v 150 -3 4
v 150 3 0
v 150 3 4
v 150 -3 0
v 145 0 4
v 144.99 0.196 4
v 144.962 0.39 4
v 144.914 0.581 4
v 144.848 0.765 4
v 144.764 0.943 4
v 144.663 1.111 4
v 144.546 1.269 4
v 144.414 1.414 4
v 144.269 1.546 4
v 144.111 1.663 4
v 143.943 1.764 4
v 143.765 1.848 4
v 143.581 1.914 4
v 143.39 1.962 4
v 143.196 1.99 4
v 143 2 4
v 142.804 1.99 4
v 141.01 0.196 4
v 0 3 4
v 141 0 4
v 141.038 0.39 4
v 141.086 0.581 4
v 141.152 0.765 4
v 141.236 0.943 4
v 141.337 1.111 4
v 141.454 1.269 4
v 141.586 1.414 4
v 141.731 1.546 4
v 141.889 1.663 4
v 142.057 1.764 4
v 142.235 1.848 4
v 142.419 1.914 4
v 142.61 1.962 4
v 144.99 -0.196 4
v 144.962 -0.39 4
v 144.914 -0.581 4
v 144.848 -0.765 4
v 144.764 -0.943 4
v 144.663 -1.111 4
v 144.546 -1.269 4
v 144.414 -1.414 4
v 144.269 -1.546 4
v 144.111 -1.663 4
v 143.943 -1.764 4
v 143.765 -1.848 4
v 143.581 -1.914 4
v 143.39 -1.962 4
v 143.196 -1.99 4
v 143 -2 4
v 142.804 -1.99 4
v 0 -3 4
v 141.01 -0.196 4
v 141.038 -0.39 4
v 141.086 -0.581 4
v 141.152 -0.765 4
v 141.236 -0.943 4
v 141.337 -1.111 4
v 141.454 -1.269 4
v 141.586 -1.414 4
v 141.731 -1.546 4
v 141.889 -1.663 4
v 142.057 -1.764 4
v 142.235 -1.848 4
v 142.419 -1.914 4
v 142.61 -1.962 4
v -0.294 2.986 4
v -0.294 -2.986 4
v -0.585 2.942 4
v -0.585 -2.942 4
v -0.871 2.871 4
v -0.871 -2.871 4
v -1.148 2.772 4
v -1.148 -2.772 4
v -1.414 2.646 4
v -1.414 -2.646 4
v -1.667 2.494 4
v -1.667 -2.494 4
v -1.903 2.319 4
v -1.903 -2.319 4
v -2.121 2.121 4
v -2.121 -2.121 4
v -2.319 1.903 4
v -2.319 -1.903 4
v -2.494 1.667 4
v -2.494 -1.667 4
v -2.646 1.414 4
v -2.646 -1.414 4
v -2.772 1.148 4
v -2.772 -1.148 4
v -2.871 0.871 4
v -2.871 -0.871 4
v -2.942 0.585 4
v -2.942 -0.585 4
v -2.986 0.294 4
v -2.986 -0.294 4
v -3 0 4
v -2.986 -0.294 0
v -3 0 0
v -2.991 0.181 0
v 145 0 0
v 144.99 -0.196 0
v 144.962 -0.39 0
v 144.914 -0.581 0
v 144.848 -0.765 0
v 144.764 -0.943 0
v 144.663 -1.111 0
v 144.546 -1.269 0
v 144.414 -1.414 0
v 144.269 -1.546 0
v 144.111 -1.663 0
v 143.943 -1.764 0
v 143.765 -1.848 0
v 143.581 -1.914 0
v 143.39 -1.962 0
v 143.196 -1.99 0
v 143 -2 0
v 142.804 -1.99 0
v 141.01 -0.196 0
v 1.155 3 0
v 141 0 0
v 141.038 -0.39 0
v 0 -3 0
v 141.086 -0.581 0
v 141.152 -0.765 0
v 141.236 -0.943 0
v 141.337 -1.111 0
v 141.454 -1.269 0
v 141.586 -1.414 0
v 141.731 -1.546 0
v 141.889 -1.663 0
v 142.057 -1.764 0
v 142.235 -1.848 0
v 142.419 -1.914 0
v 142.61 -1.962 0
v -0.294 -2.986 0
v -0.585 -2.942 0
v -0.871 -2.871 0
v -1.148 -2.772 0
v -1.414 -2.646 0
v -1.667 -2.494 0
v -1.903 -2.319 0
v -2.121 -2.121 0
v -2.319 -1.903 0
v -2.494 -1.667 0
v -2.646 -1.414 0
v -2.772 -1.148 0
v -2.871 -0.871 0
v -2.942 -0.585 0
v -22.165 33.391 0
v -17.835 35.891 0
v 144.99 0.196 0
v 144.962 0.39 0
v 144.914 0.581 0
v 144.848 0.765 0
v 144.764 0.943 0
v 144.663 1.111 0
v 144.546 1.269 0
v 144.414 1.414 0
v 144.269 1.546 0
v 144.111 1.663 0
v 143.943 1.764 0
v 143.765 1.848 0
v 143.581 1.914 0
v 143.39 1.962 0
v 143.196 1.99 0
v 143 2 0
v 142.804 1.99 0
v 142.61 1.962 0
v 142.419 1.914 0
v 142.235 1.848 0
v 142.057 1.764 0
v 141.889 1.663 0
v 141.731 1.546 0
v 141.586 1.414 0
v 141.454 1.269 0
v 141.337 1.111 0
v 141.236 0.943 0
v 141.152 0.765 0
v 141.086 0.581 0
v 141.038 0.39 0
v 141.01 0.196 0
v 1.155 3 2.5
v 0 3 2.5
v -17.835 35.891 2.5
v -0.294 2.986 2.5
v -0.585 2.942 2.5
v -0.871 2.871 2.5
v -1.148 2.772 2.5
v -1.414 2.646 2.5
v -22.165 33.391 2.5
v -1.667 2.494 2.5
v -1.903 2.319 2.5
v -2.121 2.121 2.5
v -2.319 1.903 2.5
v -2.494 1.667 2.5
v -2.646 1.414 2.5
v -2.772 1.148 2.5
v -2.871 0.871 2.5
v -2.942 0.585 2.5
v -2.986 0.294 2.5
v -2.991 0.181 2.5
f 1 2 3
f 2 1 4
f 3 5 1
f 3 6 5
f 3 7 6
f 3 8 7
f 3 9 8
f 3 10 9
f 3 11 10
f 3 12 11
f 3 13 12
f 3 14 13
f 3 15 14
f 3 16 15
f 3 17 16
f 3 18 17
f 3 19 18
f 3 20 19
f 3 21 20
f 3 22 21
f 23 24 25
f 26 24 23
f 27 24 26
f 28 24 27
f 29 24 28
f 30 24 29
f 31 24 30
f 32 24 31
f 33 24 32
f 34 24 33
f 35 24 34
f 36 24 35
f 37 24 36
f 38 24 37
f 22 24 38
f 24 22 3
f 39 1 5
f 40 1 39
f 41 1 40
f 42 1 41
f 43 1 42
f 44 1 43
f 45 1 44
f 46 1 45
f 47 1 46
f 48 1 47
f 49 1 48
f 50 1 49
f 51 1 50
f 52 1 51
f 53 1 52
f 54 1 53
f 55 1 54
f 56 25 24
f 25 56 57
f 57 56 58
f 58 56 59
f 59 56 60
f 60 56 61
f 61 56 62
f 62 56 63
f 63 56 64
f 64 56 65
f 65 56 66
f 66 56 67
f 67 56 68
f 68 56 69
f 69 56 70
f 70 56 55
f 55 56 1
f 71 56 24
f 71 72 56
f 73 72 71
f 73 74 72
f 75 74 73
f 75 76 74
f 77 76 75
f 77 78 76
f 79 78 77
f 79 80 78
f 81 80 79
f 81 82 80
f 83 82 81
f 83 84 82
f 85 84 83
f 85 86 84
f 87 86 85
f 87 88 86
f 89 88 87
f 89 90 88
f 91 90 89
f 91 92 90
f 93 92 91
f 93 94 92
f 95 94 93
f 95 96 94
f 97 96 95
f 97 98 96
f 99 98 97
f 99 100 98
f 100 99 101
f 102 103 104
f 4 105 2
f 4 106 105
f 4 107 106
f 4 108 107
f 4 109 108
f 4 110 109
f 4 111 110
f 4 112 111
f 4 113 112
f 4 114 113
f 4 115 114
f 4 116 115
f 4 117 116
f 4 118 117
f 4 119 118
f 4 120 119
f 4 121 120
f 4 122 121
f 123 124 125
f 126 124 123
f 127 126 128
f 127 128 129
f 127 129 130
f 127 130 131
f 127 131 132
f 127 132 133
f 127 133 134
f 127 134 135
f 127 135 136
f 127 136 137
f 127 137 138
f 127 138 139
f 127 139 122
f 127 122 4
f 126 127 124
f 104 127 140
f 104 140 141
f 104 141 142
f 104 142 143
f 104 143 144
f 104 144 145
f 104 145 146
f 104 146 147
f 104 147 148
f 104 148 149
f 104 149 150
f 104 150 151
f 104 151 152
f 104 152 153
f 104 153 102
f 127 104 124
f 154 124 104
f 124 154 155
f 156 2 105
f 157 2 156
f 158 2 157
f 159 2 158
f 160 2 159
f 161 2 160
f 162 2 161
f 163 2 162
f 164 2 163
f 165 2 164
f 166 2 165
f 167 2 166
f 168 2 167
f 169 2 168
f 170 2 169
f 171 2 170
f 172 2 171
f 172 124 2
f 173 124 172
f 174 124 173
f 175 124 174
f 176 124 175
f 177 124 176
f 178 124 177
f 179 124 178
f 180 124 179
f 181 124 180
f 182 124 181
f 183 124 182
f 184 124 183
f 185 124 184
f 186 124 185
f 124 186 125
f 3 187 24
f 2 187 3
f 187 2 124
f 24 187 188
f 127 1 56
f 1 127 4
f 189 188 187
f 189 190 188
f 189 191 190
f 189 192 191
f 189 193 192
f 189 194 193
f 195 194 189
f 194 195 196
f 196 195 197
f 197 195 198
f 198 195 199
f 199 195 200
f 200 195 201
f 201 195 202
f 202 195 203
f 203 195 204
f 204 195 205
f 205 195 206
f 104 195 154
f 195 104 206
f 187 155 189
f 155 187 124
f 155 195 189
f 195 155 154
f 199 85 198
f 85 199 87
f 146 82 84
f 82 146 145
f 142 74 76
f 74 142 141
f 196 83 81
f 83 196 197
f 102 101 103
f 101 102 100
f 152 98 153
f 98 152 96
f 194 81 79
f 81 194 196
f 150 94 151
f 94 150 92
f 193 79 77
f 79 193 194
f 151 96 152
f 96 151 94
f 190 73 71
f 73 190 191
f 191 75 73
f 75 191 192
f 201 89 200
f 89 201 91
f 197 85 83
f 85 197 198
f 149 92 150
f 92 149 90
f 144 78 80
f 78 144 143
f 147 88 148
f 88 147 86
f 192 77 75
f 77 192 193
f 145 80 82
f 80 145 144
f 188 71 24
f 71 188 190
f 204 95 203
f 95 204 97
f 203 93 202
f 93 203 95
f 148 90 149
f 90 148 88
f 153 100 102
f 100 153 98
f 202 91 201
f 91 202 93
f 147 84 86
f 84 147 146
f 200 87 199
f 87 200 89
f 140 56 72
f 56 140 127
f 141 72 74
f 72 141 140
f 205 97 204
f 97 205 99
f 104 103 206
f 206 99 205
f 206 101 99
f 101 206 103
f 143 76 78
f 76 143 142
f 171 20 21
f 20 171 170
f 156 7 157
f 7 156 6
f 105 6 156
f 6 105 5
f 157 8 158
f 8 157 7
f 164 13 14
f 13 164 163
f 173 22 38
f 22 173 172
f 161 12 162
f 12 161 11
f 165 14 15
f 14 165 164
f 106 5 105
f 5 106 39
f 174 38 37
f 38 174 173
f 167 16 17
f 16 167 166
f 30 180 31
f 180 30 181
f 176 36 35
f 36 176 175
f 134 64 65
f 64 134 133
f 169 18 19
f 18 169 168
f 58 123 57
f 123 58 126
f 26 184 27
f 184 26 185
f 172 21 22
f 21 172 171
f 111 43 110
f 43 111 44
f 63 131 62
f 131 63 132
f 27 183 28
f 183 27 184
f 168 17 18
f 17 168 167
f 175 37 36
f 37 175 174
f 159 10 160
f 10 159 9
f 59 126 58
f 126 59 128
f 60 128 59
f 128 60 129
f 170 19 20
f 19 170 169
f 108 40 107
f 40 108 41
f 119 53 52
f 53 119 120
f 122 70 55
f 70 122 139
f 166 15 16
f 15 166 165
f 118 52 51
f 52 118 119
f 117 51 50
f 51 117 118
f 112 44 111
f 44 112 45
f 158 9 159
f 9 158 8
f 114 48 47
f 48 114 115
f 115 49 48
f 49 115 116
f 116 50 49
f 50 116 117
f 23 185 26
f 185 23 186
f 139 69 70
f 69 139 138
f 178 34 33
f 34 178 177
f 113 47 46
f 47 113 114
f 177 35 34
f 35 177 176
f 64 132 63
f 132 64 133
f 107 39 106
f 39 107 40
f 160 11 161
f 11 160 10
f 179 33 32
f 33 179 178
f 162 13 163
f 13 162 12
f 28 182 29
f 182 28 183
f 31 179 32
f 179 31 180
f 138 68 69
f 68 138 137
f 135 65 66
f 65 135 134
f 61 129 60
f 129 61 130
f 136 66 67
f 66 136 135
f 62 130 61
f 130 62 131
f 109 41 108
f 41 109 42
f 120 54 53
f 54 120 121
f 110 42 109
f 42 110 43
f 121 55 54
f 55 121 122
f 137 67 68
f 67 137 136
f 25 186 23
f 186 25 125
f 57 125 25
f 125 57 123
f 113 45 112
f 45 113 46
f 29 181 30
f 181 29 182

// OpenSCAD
// --- Dimensions ---
handle_length = 150;      // Length of the handle bar (mm)
handle_width = 6;         // Width of the handle bar (mm)
handle_thickness = 4;     // Thickness of the handle bar (mm)

foot_length = 40;         // Length of the spreading foot (mm)
foot_width = 5;           // Width of the spreading foot (mm)
foot_thickness = 2.5;     // Thickness of the spreading foot (mm)

boss_diameter = 6;        // Diameter of the joining boss (mm)
boss_height = 4;          // Height of the joining boss (mm)

hole_diameter = 4;        // Diameter of the hanging hole (mm)
hole_x_pos = 143;         // X position of the hole center (mm)

angle_deg = 120;          // Angle of the foot relative to the handle (degrees)

// --- Constants ---
$fn = 64;

// --- Main Model ---
// The part is printed lying flat on the XY plane (Z=0 is the bottom).
// The handle is defined from X=0 to 150.
// The foot centerline starts at the origin and points 120 deg CCW from +X.

difference() {
    // The solid geometry
    union() {
        // 1. The Handle
        // Specification: x = 0 to 150, y = -3 to 3, z = 0 to 4.
        // We translate the cube so its corner is at (0,0,0) and it extends to (150, 6, 4).
        // To center it on Y, we use y = -3 to 3.
        translate([0, -handle_width/2, 0])
        cube([handle_length, handle_width, handle_thickness]);

        // 2. The Spreading Foot
        // Specification: 40mm long, 5mm wide, 2.5mm thick.
        // Centerline starts at origin and points 120 deg CCW from +X.
        // To ensure it is joined to the handle at the origin, we rotate first.
        // We translate it so the start of the foot is at the origin.
        rotate([0, 0, angle_deg])
        translate([0, -foot_width/2, 0])
        cube([foot_length, foot_width, foot_thickness]);

        // 3. The Boss
        // Specification: 6mm diameter, 4mm tall at the origin.
        // To ensure it sits on the bed (Z=0), we translate it to Z=0.
        translate([0, 0, 0])
        cylinder(h = boss_height, d = boss_diameter);
    }

    // 4. The Hanging Hole
    // Specification: 4mm diameter through the handle at x = 143, y = 0.
    // We extend the cylinder slightly in Z to ensure a clean cut through the 4mm thickness.
    translate([hole_x_pos, 0, -1])
    cylinder(h = handle_thickness + 2, d = hole_diameter);
}

// Verification of geometry against report:
// - Handle: X [0, 150], Y [-3, 3], Z [0, 4] -> Correct.
// - Foot: Starts at origin, length 40, angle 120 deg -> Correct.
// - Boss: Diameter 6, Height 4, at origin -> Correct.
// - Hole: X=143, Y=0, Diameter 4 -> Correct.
// - Print Orientation: All components start at Z=0 (no negative Z).
